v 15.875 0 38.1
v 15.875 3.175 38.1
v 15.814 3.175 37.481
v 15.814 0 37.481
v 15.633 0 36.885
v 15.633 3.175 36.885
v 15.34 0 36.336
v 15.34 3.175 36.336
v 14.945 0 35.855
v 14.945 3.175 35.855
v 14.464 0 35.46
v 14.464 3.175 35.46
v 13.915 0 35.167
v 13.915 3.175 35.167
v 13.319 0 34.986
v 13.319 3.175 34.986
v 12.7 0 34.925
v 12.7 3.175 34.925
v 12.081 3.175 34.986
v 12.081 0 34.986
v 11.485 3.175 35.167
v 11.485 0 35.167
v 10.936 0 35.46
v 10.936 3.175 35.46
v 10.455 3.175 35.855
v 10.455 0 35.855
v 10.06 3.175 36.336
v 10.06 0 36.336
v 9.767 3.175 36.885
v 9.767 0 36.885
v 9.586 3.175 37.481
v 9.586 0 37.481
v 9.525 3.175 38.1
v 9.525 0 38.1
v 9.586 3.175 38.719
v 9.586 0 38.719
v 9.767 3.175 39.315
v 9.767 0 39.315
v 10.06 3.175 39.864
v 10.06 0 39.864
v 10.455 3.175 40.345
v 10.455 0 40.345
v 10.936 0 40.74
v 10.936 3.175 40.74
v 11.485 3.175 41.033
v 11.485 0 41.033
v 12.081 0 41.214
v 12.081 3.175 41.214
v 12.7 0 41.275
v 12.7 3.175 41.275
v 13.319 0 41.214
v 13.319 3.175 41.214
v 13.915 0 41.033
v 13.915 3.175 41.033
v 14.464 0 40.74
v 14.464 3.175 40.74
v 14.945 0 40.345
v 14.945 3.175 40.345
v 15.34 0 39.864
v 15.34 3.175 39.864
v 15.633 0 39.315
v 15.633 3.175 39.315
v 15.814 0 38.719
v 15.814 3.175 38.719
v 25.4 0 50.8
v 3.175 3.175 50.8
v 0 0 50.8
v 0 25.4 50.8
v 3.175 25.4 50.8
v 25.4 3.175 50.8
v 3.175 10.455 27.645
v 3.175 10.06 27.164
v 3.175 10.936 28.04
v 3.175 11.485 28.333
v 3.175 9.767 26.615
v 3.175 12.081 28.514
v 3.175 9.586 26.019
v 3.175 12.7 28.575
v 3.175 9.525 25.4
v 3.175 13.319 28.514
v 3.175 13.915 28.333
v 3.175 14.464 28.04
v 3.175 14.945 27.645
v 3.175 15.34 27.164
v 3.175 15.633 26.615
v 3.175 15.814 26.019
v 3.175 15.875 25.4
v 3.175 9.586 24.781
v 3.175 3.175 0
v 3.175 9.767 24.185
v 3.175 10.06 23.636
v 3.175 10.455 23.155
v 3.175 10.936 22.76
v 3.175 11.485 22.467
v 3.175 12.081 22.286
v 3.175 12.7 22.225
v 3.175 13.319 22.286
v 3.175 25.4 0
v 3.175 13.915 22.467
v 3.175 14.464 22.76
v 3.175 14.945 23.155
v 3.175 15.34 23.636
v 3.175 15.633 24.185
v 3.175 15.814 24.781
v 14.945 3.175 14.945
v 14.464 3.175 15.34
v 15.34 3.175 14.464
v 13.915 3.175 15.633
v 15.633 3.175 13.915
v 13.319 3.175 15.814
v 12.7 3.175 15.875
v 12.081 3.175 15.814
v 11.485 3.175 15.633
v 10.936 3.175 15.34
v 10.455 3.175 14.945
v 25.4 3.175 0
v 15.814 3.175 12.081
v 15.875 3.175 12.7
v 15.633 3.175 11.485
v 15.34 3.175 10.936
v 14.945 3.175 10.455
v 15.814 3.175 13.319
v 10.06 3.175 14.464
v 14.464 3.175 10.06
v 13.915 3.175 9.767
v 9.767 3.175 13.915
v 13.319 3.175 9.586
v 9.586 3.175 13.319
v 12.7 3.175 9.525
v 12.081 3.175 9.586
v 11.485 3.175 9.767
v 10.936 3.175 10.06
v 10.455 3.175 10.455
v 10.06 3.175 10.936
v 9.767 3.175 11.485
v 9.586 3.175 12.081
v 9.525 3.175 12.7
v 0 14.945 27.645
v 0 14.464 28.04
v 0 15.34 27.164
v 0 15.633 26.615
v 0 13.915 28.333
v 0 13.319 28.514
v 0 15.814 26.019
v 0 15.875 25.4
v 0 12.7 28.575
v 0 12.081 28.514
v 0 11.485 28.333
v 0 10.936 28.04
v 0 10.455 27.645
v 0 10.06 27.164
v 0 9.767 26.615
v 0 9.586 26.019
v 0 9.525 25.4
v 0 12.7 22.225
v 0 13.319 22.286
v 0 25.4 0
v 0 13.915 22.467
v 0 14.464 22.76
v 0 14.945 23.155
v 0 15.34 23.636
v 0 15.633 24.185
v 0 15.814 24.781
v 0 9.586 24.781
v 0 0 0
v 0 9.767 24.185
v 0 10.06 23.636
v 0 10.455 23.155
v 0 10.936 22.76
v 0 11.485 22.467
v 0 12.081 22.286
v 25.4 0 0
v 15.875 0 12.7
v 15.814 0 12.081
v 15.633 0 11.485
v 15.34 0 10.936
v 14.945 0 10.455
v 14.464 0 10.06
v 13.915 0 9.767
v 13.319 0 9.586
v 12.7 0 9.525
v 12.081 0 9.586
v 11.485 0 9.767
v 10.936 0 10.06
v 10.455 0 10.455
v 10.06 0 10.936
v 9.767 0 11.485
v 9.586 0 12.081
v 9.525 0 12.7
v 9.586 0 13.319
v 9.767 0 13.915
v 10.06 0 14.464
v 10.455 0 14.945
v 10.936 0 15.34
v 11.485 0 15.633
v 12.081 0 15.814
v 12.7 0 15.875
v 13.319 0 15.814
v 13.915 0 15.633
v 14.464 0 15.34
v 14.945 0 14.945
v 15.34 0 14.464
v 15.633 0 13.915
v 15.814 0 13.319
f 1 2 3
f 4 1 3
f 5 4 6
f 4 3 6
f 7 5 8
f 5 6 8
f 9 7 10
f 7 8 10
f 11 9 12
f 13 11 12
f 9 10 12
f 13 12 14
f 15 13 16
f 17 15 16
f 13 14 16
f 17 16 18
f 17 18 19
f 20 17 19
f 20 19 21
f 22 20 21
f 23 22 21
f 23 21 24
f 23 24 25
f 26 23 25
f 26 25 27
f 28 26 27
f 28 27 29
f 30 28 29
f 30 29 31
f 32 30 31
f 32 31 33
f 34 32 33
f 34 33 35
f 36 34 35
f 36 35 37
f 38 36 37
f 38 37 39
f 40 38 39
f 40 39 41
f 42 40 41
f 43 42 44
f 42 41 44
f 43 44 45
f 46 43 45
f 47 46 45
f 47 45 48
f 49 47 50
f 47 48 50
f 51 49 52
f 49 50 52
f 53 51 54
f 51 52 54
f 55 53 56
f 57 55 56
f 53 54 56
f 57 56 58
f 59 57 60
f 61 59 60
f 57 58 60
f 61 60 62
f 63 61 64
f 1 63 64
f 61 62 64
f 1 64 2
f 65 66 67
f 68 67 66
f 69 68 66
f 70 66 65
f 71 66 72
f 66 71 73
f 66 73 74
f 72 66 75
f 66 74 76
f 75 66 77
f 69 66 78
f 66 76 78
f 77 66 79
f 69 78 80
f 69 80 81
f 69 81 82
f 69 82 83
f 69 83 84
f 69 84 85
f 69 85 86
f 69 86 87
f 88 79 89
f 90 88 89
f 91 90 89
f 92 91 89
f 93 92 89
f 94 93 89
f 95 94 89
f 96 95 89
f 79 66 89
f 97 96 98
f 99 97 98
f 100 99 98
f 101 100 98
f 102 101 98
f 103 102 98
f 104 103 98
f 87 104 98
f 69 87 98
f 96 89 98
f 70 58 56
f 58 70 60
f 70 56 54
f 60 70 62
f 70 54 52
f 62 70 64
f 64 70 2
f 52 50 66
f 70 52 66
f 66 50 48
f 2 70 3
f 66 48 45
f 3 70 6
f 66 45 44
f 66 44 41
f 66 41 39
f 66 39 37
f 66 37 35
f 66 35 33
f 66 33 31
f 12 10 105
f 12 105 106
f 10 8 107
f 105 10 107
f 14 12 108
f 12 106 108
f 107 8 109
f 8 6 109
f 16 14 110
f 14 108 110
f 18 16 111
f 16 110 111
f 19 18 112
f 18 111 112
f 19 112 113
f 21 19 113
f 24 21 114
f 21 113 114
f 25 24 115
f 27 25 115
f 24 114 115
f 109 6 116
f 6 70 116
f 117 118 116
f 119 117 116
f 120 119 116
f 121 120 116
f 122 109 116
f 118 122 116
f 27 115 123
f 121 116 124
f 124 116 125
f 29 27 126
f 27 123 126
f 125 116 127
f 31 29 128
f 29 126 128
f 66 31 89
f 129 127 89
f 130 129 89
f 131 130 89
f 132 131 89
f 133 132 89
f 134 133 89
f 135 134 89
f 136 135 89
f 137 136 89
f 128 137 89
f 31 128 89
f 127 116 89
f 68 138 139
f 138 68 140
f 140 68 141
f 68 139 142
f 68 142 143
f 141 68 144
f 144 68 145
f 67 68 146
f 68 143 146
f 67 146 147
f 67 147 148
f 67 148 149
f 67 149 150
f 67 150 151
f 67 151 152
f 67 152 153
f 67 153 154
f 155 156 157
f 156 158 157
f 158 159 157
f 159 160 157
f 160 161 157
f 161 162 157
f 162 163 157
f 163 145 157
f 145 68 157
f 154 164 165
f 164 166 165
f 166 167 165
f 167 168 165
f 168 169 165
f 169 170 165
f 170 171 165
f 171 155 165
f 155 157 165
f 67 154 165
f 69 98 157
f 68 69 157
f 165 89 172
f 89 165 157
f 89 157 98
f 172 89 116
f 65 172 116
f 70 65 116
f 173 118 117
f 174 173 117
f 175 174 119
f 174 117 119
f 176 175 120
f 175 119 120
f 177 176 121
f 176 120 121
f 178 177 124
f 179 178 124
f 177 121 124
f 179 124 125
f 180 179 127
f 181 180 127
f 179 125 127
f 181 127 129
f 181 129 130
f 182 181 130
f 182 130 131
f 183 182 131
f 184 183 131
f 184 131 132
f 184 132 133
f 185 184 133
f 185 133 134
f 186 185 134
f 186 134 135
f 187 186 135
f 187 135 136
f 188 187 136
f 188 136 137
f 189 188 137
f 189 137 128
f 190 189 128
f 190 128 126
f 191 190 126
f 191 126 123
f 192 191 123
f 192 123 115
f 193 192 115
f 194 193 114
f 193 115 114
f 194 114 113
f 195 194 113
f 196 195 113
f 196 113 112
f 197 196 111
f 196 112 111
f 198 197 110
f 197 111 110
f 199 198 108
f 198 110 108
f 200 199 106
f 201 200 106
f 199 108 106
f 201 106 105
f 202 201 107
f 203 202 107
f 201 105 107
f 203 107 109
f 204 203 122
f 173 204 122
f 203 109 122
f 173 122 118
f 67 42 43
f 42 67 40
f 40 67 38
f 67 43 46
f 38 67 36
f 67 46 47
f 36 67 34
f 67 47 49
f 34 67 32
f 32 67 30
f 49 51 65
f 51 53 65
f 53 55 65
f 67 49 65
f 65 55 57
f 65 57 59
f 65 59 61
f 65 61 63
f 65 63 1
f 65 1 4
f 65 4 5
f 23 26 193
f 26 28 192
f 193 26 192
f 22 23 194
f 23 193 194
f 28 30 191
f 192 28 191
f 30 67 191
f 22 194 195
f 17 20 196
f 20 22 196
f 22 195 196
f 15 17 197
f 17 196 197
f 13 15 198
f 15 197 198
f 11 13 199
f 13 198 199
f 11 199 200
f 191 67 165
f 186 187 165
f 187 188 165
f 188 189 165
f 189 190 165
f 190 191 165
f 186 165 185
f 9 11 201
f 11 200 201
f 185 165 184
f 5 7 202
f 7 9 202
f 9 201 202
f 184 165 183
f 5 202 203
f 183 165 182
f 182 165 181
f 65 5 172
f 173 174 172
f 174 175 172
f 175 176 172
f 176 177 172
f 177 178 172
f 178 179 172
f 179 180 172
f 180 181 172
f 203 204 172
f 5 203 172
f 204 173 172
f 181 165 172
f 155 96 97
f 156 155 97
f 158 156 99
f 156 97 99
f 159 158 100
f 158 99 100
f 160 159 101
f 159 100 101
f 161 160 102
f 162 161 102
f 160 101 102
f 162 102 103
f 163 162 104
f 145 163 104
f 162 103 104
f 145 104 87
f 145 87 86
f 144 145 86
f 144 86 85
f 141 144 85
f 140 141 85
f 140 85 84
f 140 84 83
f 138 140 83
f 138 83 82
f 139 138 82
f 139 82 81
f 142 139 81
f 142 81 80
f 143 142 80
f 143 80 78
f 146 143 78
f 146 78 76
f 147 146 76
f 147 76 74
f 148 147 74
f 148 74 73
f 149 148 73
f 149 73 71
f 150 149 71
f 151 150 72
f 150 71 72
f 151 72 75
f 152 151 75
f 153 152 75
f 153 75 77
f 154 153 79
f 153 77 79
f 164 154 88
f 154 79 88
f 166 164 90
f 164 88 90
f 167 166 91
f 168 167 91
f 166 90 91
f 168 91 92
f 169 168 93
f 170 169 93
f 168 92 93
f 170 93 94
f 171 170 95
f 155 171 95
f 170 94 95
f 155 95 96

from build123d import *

# Parameters (mm, degrees)
BOSS_EXTRUDE1_DEPTH = 50.8
SKETCH2_R           = 3.175
CUT_EXTRUDE1_DEPTH  = 4.175
SKETCH3_R           = 3.175
CUT_EXTRUDE2_DEPTH  = 4.175


with BuildPart() as part:
    # Sketch1 → Boss-Extrude1 (new body)
    with BuildSketch(Plane.XY):
        Polygon((0, 0), (25.4, 0), (25.4, 3.175), (3.175, 3.175), (3.175, 25.4), (0, 25.4), align=None)
    extrude(amount=BOSS_EXTRUDE1_DEPTH)

    # Sketch2 → Cut-Extrude1 (cut, through all)
    with BuildSketch(Plane(origin=(3.175, 0, 0), x_dir=(0, 0, -1), z_dir=(1, 0, 0))):
        with Locations((-25.4, 12.7)):
            Circle(SKETCH2_R)
    extrude(amount=-CUT_EXTRUDE1_DEPTH, mode=Mode.SUBTRACT)

    # Sketch3 → Cut-Extrude2 (cut, through all)
    with BuildSketch(Plane(origin=(0, 3.175, 0), x_dir=(1, 0, 0), z_dir=(0, 1, 0))):
        with Locations((12.7, -38.1)):
            Circle(SKETCH3_R)
        with Locations((12.7, -12.7)):
            Circle(SKETCH3_R)
    extrude(amount=-CUT_EXTRUDE2_DEPTH, mode=Mode.SUBTRACT)


solid = part.part
